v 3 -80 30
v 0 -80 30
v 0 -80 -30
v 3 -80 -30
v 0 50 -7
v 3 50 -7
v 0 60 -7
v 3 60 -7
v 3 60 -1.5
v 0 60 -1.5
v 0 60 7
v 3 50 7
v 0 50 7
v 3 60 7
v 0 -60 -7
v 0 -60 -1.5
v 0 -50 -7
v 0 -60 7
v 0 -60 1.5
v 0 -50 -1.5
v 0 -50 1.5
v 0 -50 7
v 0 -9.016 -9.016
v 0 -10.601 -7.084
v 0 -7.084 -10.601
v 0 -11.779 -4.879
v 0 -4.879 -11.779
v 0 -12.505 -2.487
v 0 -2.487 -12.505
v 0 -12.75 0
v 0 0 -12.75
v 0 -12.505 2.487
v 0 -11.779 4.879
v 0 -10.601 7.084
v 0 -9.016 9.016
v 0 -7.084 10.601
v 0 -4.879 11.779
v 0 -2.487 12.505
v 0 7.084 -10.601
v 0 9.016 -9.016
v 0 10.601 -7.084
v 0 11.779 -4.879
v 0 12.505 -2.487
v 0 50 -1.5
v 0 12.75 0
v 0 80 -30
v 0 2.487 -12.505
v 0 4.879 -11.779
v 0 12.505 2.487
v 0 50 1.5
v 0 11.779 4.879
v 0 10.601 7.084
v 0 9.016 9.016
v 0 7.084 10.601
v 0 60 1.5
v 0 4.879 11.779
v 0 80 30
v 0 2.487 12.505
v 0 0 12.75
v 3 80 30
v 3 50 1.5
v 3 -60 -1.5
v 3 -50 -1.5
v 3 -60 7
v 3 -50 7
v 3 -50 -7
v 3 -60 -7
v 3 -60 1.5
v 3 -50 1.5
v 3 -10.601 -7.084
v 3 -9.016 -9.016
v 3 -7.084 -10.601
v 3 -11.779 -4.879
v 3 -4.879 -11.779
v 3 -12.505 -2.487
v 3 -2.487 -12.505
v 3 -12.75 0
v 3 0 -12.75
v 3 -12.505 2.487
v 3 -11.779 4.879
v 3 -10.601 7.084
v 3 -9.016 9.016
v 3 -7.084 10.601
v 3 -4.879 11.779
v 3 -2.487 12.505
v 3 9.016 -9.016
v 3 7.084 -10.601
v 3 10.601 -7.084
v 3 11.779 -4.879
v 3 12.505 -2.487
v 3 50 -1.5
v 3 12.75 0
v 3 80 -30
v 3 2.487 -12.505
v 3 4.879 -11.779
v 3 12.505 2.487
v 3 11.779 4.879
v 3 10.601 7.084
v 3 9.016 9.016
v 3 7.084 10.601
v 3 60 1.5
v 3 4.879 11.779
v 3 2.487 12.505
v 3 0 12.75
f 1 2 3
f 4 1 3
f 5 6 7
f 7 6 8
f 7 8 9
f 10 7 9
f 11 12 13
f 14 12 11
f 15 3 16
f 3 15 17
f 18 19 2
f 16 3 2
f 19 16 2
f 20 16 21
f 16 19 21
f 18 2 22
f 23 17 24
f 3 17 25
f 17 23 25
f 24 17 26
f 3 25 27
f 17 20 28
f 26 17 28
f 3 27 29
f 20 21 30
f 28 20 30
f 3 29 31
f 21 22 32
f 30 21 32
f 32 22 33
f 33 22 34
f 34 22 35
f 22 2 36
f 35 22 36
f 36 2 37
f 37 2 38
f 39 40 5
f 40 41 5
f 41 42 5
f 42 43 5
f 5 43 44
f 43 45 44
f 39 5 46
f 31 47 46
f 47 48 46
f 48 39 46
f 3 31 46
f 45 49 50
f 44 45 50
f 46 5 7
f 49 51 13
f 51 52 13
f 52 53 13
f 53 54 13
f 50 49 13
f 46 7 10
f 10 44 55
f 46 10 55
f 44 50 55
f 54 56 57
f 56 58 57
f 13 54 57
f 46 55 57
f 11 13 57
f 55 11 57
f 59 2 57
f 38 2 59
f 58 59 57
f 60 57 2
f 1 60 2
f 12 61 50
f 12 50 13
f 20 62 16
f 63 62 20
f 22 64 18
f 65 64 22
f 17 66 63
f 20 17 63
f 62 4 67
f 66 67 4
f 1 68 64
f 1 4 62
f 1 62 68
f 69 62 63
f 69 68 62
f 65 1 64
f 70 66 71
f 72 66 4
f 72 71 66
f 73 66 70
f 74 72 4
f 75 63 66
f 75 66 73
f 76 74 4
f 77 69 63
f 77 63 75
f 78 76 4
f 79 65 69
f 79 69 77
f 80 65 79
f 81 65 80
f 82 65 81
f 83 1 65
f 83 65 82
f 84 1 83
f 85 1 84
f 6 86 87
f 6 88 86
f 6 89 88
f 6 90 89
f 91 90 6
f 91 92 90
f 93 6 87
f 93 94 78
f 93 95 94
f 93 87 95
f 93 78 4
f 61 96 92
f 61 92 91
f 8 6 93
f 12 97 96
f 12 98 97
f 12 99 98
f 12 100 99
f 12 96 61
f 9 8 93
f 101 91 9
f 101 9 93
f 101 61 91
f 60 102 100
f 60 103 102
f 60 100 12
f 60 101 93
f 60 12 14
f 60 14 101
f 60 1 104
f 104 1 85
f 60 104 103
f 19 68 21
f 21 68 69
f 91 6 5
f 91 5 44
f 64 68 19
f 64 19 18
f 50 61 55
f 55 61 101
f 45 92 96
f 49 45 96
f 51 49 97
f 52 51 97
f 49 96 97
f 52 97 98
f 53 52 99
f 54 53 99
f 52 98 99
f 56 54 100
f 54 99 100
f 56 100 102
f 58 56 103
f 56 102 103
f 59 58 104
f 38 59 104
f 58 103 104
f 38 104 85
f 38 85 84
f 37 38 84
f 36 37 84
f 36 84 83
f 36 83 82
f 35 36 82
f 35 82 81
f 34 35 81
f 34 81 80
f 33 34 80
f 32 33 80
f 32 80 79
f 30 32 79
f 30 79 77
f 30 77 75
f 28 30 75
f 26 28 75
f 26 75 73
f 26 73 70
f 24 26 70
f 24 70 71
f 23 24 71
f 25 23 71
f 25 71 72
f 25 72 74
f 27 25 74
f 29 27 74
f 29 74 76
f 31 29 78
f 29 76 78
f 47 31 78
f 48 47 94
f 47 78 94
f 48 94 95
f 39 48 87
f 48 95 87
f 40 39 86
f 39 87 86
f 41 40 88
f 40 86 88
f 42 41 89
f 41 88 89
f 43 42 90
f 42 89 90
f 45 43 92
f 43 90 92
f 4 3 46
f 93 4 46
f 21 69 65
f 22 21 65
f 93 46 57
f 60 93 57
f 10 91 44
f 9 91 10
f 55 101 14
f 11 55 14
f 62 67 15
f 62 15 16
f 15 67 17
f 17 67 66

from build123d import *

# Parameters (mm, degrees)
F1_DEPTH = 3
F2_W     = 10
F2_H     = 5.5
F3_DEPTH = 25
F4_R     = 12.75
F5_DEPTH = 25


with BuildPart() as f1:
    # F0 (on Right) → F1 (new body)
    with BuildSketch(Plane.YZ):
        Polygon((80, 30), (0, 30), (-80, 30), (-80, -30), (0, -30), (80, -30), align=None)
    extrude(amount=F1_DEPTH)

    # F2 (on face) → F3 (cut)
    with BuildSketch(Plane.YZ.offset(3)):
        with Locations((-55, -4.25)):
            Rectangle(F2_W, F2_H)
        with Locations((-55, 4.25)):
            Rectangle(F2_W, F2_H)
        with Locations((55, 4.25)):
            Rectangle(F2_W, F2_H)
        with Locations((55, -4.25)):
            Rectangle(F2_W, F2_H)
    extrude(amount=-F3_DEPTH, mode=Mode.SUBTRACT)

    # F4 (on face) → F5 (cut)
    with BuildSketch(Plane.YZ.offset(3)):
        Circle(F4_R)
    extrude(amount=-F5_DEPTH, mode=Mode.SUBTRACT)


solid = f1.part
